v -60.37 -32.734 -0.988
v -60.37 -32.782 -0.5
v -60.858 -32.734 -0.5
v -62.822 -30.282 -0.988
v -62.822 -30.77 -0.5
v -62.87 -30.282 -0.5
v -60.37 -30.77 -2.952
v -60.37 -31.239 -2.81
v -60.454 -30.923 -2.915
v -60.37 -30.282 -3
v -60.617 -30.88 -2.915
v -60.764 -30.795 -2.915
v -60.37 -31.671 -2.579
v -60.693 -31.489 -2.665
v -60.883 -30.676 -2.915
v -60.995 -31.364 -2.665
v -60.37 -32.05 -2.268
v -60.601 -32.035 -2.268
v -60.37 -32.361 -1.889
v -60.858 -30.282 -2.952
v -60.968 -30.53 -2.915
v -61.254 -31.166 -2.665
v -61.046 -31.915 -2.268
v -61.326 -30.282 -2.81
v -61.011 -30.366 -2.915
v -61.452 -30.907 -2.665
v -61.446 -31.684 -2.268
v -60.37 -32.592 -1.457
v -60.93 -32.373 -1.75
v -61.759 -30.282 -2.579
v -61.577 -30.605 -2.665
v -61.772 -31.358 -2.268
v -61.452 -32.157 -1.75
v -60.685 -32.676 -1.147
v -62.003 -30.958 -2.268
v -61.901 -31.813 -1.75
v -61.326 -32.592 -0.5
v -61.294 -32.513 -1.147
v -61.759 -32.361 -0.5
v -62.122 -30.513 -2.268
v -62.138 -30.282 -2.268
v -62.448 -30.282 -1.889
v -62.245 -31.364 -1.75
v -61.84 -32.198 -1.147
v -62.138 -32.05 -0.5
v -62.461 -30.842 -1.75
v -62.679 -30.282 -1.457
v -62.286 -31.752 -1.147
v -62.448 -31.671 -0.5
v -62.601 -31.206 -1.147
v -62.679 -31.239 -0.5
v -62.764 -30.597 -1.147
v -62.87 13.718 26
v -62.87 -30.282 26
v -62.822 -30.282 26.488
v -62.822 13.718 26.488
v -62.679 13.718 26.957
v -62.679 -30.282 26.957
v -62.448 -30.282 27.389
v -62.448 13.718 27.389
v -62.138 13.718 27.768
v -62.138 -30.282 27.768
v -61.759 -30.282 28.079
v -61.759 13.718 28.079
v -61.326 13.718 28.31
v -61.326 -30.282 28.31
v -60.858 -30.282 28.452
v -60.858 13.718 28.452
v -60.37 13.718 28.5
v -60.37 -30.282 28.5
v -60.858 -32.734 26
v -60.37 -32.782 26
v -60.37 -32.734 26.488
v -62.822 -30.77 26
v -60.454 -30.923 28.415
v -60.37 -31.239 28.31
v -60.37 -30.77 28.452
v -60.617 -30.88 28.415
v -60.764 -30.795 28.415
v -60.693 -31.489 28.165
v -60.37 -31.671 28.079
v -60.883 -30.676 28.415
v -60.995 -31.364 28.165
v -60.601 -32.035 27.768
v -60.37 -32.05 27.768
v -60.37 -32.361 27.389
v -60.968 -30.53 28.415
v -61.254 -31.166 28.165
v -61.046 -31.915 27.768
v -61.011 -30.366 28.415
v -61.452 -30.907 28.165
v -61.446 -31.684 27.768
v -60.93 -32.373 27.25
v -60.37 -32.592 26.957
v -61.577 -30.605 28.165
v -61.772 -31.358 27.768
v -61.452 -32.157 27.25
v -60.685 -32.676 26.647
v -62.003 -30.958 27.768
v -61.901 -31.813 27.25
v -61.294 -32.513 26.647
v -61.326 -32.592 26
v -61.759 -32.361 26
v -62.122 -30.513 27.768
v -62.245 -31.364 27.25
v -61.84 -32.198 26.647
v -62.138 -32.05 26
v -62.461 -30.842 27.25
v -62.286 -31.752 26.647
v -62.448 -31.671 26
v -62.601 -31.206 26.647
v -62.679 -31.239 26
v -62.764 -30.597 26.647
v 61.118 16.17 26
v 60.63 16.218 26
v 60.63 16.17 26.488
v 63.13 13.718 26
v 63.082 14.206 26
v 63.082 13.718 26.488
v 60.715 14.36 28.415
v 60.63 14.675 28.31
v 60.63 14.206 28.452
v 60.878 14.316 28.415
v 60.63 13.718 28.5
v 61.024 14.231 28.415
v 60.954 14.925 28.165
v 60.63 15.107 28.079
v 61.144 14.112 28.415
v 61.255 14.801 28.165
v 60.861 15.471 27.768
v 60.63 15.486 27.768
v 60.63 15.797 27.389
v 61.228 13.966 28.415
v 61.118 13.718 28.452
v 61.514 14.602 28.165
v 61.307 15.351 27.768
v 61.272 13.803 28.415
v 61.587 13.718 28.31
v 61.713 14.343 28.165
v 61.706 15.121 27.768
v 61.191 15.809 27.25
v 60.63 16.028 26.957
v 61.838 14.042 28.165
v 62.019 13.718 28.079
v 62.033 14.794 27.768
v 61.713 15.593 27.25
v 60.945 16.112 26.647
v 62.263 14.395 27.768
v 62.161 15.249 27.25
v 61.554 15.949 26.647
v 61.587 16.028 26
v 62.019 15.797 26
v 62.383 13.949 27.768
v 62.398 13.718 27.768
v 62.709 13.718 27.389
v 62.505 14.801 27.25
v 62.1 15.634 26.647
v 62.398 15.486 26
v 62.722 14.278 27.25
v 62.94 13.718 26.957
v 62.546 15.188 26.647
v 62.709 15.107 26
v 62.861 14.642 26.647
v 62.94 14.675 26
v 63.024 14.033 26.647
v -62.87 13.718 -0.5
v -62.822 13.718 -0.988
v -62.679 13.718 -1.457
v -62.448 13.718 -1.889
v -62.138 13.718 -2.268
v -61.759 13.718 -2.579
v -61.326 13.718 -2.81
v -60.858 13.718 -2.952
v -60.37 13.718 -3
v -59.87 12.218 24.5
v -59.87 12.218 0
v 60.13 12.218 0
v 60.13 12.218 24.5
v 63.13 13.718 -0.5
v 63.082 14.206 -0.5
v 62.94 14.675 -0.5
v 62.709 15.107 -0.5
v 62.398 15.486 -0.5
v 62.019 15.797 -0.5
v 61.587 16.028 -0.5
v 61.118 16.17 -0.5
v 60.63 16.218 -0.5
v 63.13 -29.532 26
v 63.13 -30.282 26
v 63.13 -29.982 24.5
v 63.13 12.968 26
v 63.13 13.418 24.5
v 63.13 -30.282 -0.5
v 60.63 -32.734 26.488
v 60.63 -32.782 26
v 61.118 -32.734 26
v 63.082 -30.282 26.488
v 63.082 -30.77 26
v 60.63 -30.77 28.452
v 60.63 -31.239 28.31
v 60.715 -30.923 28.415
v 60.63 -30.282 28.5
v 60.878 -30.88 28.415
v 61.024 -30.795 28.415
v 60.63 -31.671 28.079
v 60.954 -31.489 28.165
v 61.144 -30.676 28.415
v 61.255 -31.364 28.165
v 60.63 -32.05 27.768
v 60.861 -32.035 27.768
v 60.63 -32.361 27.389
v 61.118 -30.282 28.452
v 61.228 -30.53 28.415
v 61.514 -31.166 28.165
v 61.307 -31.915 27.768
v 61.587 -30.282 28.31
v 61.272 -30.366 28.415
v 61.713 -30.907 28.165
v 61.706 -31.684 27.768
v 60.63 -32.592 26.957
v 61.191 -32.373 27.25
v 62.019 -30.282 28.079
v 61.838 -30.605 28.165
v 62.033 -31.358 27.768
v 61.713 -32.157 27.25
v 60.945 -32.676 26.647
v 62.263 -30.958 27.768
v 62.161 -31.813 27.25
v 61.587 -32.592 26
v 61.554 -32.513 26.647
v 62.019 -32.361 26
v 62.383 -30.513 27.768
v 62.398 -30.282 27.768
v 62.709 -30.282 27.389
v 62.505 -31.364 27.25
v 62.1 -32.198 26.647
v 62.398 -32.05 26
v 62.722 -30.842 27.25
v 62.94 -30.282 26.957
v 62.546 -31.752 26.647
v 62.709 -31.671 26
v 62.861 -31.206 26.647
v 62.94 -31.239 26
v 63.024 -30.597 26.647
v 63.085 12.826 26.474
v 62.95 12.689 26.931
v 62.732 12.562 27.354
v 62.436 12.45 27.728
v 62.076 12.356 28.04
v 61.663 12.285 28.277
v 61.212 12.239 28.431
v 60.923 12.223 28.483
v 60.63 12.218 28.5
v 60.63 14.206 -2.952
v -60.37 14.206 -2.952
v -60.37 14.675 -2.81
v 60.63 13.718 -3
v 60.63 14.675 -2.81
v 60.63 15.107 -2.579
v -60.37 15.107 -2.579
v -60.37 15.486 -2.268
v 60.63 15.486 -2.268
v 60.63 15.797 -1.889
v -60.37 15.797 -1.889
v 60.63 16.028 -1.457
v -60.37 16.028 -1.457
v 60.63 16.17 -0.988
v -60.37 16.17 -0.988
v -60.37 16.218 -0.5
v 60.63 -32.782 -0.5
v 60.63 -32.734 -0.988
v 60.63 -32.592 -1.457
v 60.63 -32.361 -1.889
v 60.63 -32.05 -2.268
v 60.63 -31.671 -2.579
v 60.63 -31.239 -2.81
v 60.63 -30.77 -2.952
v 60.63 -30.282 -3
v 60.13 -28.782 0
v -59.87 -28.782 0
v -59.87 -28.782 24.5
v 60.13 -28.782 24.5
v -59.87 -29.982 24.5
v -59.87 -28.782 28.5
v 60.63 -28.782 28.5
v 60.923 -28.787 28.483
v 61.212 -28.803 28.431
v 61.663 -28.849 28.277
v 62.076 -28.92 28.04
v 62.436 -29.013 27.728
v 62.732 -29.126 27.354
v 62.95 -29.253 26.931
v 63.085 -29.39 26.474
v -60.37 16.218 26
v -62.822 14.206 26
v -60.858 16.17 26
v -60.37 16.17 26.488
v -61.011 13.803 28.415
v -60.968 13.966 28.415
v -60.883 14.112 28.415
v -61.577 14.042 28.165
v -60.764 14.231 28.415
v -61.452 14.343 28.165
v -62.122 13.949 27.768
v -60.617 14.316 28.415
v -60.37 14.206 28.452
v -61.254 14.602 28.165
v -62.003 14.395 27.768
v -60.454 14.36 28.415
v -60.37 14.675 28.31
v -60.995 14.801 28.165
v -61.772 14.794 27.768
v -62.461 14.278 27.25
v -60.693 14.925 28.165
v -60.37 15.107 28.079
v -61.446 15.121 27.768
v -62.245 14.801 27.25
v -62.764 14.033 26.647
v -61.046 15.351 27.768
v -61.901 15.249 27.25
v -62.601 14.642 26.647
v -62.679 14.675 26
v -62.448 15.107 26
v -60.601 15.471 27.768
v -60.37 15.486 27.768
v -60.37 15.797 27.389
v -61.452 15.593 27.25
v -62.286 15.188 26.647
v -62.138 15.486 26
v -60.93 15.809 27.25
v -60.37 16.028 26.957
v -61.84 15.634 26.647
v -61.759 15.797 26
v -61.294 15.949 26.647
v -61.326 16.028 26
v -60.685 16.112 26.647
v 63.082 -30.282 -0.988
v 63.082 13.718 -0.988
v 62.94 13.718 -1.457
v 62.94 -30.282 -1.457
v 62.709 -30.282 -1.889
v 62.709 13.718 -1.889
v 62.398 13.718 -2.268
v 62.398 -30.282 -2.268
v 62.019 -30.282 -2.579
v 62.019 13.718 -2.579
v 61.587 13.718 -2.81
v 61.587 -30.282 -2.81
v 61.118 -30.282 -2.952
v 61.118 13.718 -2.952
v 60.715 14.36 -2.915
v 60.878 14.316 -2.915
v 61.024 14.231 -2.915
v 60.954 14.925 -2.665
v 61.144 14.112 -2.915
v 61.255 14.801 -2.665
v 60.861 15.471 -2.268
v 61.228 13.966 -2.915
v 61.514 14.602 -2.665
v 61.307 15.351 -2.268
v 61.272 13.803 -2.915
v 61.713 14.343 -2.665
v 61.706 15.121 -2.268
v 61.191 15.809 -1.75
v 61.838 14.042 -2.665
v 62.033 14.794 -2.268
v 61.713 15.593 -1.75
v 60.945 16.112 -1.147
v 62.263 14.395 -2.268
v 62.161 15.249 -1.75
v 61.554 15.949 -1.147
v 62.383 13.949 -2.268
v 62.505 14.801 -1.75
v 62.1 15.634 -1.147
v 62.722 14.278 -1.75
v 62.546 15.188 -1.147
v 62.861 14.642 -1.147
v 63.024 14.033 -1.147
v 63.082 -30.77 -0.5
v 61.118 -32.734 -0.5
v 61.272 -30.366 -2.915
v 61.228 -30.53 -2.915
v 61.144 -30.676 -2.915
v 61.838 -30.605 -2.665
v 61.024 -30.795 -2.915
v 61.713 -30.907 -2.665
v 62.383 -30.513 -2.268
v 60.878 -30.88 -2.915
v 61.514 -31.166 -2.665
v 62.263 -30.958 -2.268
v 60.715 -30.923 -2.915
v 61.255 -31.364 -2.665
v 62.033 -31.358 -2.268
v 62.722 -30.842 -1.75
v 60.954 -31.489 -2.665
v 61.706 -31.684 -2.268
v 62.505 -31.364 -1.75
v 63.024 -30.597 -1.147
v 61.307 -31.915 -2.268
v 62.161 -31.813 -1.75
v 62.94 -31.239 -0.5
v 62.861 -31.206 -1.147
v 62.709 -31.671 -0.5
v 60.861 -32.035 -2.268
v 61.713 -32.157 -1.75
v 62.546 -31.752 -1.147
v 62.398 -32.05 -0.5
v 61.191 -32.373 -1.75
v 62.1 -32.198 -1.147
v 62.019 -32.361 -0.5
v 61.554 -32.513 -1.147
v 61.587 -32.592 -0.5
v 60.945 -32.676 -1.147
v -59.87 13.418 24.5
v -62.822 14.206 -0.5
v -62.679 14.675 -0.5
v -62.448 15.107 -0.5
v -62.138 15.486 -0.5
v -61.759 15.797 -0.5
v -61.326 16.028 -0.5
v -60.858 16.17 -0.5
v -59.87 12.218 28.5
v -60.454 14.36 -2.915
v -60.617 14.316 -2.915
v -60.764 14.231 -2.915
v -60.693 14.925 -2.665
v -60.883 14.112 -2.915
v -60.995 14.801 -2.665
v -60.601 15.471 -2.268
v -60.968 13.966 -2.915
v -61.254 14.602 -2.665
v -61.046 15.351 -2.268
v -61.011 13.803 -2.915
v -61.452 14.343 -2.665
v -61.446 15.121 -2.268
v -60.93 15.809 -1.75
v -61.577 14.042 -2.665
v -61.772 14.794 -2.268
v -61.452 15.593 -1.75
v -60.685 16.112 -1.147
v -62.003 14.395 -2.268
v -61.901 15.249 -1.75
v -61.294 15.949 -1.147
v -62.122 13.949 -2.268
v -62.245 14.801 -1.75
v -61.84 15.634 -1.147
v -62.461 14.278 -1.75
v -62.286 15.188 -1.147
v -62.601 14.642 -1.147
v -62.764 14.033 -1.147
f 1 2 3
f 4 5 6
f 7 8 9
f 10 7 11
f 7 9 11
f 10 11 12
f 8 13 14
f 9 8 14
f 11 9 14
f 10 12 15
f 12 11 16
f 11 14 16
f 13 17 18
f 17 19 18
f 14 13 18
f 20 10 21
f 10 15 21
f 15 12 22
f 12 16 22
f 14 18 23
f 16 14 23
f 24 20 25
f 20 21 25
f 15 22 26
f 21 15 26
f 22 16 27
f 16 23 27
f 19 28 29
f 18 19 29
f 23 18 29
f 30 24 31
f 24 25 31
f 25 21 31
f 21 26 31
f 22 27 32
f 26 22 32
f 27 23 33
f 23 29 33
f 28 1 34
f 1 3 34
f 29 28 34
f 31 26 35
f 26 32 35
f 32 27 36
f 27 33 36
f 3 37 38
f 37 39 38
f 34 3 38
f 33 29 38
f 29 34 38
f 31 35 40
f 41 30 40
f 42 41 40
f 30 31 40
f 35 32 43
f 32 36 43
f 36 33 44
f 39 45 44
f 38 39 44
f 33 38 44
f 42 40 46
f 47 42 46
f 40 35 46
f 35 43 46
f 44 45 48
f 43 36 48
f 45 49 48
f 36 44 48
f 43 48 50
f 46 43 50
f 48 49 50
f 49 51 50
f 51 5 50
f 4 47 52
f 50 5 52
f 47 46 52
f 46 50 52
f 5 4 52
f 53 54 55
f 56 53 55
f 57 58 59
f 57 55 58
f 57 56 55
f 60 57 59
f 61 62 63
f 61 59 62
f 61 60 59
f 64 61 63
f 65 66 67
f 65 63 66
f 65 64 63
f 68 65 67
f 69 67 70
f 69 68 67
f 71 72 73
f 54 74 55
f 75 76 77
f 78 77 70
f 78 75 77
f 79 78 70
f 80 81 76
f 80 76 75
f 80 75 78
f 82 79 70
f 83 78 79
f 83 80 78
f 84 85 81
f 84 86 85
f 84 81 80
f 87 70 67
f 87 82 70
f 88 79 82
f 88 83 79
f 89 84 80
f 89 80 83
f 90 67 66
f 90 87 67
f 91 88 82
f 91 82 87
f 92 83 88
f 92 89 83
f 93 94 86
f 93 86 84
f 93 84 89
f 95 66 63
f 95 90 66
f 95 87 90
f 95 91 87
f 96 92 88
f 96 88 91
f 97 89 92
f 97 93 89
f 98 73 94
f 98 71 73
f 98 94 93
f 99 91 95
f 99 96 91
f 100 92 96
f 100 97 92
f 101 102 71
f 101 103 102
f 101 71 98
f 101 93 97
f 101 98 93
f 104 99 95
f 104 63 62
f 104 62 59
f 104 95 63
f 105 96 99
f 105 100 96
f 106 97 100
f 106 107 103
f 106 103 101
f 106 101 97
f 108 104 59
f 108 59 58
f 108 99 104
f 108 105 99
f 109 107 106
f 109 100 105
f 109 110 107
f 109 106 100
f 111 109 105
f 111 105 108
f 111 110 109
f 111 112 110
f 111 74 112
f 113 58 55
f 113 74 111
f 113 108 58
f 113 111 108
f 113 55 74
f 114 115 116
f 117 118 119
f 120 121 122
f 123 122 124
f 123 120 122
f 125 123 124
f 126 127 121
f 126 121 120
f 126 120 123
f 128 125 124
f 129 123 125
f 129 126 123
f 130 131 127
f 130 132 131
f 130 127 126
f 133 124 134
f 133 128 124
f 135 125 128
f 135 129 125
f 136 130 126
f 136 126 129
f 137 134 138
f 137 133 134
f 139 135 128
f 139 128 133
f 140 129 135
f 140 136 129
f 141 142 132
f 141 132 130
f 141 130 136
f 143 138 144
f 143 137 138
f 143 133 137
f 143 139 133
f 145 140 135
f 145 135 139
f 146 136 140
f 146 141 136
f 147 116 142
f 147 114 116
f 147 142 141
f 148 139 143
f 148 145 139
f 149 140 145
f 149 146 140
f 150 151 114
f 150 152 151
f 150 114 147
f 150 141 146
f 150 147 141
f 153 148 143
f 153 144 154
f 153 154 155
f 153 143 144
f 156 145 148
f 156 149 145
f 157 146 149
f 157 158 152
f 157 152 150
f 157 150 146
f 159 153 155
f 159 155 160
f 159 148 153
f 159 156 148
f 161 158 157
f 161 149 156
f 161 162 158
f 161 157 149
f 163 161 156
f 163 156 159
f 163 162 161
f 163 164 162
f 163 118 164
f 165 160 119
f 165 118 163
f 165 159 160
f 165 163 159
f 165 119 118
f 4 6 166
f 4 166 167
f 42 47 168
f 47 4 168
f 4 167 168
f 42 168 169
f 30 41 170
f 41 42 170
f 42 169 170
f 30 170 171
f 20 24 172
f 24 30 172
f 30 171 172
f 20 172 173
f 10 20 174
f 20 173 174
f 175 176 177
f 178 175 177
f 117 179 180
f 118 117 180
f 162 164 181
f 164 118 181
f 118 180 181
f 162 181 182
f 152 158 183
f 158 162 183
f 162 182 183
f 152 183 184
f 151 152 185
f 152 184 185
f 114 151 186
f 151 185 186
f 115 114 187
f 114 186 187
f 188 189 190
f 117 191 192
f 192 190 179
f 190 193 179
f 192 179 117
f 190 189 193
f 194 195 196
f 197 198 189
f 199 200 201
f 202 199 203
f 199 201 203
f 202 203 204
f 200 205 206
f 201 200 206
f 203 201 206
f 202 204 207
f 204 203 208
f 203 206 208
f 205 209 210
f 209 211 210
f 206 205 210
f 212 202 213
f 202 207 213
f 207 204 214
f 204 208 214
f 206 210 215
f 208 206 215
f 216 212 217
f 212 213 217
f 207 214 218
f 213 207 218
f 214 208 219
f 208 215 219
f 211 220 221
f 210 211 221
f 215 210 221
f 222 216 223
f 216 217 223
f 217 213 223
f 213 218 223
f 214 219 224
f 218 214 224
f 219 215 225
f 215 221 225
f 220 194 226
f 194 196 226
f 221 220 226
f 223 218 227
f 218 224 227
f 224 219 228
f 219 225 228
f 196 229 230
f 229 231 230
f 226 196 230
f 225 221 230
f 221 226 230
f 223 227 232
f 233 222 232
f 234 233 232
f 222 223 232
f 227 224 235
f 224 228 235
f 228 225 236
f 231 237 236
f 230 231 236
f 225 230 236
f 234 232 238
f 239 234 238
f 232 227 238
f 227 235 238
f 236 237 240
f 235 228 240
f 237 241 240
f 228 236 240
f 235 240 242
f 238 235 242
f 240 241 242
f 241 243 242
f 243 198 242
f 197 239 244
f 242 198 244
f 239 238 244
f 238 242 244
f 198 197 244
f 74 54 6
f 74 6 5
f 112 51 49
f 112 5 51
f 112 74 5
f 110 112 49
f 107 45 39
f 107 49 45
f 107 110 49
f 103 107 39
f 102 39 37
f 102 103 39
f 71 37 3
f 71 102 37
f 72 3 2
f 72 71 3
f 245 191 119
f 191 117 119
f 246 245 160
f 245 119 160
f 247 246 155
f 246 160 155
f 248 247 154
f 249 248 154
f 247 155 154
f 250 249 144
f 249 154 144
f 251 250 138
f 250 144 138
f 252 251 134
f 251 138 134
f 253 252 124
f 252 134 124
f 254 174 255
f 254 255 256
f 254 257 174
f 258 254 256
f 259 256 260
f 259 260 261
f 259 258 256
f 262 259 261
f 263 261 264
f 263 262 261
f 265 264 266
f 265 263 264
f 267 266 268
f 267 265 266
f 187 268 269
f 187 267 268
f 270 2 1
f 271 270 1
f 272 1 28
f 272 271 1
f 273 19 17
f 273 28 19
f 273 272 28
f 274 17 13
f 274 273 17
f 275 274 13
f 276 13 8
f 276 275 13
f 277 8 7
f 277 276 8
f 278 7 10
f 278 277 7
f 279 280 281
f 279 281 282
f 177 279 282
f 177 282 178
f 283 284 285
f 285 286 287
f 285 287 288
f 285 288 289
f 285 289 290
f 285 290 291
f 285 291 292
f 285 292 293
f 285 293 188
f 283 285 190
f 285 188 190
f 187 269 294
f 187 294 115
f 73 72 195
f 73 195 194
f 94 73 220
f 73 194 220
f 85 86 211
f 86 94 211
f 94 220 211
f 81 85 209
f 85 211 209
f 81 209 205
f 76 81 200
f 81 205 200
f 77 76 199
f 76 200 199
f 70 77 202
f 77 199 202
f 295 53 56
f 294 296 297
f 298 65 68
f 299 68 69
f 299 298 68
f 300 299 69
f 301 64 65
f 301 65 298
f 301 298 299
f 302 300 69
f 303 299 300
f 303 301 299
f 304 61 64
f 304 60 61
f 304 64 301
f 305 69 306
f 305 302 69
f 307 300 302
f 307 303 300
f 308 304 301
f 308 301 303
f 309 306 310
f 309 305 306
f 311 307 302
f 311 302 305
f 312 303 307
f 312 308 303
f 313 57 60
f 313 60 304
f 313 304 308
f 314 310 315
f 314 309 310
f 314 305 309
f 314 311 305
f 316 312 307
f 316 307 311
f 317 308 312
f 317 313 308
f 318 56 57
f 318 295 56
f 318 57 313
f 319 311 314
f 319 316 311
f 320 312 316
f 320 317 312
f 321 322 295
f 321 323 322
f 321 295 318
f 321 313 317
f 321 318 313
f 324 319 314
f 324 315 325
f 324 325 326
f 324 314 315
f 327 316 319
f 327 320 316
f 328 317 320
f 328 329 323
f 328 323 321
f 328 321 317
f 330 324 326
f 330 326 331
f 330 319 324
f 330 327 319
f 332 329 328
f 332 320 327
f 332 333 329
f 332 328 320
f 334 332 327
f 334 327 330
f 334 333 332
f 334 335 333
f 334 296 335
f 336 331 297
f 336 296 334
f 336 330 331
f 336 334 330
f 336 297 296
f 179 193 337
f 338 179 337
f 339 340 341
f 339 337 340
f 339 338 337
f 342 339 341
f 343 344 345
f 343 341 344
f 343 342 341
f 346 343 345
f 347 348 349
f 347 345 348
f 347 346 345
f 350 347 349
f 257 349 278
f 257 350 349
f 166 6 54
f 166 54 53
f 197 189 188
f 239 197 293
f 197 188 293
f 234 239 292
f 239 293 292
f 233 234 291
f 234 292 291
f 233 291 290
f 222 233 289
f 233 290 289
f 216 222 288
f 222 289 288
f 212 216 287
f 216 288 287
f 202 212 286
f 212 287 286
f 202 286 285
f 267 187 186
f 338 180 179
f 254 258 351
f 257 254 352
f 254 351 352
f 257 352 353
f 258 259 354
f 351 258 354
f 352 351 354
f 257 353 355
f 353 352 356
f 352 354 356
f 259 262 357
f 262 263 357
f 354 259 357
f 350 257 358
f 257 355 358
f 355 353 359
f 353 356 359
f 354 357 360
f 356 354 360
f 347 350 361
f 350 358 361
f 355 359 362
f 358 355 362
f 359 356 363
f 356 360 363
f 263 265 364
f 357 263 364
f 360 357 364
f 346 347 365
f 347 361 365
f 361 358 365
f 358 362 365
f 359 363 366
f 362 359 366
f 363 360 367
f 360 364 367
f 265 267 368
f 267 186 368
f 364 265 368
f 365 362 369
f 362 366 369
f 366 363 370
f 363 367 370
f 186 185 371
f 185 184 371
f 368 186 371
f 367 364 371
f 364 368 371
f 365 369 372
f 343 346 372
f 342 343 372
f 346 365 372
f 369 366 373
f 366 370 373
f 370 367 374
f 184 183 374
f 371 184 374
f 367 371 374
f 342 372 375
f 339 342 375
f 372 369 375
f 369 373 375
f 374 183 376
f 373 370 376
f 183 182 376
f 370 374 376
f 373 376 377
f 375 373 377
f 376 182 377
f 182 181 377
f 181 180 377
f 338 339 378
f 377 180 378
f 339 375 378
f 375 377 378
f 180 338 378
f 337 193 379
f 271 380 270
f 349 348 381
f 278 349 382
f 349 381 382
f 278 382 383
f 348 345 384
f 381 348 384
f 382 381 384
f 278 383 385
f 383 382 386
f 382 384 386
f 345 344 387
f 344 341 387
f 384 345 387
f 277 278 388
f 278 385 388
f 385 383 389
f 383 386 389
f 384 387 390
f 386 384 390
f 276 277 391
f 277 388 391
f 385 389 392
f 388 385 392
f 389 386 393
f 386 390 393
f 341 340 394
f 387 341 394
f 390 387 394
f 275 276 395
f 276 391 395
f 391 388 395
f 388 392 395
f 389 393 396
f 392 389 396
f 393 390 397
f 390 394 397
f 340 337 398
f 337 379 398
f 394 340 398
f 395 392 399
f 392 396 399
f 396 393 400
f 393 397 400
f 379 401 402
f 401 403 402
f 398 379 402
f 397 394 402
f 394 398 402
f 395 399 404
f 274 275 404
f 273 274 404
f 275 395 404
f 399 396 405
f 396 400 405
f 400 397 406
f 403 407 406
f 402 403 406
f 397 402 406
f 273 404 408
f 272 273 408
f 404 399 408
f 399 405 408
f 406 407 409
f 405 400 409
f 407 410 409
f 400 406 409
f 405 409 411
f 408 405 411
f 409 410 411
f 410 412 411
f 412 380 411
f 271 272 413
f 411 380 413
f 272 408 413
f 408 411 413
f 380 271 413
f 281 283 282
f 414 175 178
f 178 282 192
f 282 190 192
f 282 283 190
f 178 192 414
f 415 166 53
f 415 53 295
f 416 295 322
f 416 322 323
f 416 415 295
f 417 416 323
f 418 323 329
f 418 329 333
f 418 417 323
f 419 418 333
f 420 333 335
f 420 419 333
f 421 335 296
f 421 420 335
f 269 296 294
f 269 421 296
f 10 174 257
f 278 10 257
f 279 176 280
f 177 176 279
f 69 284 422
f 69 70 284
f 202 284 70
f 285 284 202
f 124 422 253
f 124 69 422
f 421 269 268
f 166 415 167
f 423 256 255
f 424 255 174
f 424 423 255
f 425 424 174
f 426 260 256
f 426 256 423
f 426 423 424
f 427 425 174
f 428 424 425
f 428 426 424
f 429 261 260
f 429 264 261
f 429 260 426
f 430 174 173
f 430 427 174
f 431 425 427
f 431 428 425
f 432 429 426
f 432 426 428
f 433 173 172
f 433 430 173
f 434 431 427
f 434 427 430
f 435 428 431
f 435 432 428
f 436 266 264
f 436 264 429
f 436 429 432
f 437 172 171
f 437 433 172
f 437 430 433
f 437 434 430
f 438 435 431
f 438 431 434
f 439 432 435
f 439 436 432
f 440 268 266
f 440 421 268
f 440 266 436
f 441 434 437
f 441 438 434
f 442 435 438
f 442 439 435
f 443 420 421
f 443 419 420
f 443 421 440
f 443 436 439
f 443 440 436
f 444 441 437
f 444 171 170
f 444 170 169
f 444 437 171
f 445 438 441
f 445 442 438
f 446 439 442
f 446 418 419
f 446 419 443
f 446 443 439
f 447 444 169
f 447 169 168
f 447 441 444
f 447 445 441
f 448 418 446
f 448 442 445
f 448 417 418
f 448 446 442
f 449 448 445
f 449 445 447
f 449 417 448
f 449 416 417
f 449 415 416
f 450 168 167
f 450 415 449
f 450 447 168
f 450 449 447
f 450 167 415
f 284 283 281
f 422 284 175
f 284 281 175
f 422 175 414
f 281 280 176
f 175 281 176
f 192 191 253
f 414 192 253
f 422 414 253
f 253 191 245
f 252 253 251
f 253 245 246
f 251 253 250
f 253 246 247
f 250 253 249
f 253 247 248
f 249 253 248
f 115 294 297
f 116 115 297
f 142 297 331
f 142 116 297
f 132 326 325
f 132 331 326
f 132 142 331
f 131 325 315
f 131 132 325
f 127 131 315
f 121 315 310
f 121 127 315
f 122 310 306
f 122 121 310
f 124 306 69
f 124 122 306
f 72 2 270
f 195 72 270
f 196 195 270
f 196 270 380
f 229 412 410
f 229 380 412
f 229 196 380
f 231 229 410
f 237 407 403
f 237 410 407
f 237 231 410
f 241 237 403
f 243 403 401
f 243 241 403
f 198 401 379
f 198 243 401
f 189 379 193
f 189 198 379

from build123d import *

# Parameters (mm, degrees)
F1_W     = 126
F1_H     = 49
F1_W_2   = 120
F1_H_2   = 41
F2_DEPTH = 3
F3_DEPTH = 28.5
F5_DEPTH = 123
F6_R     = 2.5


with BuildPart() as f2:
    # F1 (on Top) → F2 (new body)
    with BuildSketch(Plane.XY):
        with Locations((0.1302100548, -8.2819438625)):
            Rectangle(F1_W, F1_H)
        with Locations((0.1302100548, -8.2819438625)):
            Rectangle(F1_W_2, F1_H_2, mode=Mode.SUBTRACT)
        with Locations((0.1302100548, -8.2819438625)):
            Rectangle(F1_W_2, F1_H_2)
    extrude(amount=-F2_DEPTH)

    # F1 (on Top) → F3 (join)
    with BuildSketch(Plane.XY):
        with Locations((0.1302100548, -8.2819438625)):
            Rectangle(F1_W, F1_H)
        with Locations((0.1302100548, -8.2819438625)):
            Rectangle(F1_W_2, F1_H_2, mode=Mode.SUBTRACT)
    extrude(amount=F3_DEPTH)

    # F4 (on face) → F5 (cut)
    with BuildSketch(Plane.YZ.offset(63.1302100548)):
        Polygon((12.2180561375, 28.5), (-28.7819438625, 28.5), (-29.9819438625, 24.5), (-28.7819438625, 24.5), (12.2180561375, 24.5), (13.4180561375, 24.5), align=None)
    extrude(amount=-F5_DEPTH, mode=Mode.SUBTRACT)

    # F6
    f6_edges = [f2.edges().sort_by_distance(p)[0] for p in [
        (63.13021, -32.781944, 12.75),
        (63.13021, 16.218056, 12.75),
        (-62.86979, -32.781944, 12.75),
        (-62.86979, 16.218056, 12.75),
        (0.13021, 16.218056, -3),
        (63.13021, -8.281944, -3),
        (0.13021, -32.781944, -3),
        (-62.86979, -8.281944, -3),
        (0.13021, -32.781944, 28.5),
        (-62.86979, -8.281944, 28.5),
        (0.13021, 16.218056, 28.5),
        (63.13021, 14.218056, 28.5),
        (63.13021, -30.781944, 28.5),
    ]]
    fillet(f6_edges, radius=F6_R)


solid = f2.part
